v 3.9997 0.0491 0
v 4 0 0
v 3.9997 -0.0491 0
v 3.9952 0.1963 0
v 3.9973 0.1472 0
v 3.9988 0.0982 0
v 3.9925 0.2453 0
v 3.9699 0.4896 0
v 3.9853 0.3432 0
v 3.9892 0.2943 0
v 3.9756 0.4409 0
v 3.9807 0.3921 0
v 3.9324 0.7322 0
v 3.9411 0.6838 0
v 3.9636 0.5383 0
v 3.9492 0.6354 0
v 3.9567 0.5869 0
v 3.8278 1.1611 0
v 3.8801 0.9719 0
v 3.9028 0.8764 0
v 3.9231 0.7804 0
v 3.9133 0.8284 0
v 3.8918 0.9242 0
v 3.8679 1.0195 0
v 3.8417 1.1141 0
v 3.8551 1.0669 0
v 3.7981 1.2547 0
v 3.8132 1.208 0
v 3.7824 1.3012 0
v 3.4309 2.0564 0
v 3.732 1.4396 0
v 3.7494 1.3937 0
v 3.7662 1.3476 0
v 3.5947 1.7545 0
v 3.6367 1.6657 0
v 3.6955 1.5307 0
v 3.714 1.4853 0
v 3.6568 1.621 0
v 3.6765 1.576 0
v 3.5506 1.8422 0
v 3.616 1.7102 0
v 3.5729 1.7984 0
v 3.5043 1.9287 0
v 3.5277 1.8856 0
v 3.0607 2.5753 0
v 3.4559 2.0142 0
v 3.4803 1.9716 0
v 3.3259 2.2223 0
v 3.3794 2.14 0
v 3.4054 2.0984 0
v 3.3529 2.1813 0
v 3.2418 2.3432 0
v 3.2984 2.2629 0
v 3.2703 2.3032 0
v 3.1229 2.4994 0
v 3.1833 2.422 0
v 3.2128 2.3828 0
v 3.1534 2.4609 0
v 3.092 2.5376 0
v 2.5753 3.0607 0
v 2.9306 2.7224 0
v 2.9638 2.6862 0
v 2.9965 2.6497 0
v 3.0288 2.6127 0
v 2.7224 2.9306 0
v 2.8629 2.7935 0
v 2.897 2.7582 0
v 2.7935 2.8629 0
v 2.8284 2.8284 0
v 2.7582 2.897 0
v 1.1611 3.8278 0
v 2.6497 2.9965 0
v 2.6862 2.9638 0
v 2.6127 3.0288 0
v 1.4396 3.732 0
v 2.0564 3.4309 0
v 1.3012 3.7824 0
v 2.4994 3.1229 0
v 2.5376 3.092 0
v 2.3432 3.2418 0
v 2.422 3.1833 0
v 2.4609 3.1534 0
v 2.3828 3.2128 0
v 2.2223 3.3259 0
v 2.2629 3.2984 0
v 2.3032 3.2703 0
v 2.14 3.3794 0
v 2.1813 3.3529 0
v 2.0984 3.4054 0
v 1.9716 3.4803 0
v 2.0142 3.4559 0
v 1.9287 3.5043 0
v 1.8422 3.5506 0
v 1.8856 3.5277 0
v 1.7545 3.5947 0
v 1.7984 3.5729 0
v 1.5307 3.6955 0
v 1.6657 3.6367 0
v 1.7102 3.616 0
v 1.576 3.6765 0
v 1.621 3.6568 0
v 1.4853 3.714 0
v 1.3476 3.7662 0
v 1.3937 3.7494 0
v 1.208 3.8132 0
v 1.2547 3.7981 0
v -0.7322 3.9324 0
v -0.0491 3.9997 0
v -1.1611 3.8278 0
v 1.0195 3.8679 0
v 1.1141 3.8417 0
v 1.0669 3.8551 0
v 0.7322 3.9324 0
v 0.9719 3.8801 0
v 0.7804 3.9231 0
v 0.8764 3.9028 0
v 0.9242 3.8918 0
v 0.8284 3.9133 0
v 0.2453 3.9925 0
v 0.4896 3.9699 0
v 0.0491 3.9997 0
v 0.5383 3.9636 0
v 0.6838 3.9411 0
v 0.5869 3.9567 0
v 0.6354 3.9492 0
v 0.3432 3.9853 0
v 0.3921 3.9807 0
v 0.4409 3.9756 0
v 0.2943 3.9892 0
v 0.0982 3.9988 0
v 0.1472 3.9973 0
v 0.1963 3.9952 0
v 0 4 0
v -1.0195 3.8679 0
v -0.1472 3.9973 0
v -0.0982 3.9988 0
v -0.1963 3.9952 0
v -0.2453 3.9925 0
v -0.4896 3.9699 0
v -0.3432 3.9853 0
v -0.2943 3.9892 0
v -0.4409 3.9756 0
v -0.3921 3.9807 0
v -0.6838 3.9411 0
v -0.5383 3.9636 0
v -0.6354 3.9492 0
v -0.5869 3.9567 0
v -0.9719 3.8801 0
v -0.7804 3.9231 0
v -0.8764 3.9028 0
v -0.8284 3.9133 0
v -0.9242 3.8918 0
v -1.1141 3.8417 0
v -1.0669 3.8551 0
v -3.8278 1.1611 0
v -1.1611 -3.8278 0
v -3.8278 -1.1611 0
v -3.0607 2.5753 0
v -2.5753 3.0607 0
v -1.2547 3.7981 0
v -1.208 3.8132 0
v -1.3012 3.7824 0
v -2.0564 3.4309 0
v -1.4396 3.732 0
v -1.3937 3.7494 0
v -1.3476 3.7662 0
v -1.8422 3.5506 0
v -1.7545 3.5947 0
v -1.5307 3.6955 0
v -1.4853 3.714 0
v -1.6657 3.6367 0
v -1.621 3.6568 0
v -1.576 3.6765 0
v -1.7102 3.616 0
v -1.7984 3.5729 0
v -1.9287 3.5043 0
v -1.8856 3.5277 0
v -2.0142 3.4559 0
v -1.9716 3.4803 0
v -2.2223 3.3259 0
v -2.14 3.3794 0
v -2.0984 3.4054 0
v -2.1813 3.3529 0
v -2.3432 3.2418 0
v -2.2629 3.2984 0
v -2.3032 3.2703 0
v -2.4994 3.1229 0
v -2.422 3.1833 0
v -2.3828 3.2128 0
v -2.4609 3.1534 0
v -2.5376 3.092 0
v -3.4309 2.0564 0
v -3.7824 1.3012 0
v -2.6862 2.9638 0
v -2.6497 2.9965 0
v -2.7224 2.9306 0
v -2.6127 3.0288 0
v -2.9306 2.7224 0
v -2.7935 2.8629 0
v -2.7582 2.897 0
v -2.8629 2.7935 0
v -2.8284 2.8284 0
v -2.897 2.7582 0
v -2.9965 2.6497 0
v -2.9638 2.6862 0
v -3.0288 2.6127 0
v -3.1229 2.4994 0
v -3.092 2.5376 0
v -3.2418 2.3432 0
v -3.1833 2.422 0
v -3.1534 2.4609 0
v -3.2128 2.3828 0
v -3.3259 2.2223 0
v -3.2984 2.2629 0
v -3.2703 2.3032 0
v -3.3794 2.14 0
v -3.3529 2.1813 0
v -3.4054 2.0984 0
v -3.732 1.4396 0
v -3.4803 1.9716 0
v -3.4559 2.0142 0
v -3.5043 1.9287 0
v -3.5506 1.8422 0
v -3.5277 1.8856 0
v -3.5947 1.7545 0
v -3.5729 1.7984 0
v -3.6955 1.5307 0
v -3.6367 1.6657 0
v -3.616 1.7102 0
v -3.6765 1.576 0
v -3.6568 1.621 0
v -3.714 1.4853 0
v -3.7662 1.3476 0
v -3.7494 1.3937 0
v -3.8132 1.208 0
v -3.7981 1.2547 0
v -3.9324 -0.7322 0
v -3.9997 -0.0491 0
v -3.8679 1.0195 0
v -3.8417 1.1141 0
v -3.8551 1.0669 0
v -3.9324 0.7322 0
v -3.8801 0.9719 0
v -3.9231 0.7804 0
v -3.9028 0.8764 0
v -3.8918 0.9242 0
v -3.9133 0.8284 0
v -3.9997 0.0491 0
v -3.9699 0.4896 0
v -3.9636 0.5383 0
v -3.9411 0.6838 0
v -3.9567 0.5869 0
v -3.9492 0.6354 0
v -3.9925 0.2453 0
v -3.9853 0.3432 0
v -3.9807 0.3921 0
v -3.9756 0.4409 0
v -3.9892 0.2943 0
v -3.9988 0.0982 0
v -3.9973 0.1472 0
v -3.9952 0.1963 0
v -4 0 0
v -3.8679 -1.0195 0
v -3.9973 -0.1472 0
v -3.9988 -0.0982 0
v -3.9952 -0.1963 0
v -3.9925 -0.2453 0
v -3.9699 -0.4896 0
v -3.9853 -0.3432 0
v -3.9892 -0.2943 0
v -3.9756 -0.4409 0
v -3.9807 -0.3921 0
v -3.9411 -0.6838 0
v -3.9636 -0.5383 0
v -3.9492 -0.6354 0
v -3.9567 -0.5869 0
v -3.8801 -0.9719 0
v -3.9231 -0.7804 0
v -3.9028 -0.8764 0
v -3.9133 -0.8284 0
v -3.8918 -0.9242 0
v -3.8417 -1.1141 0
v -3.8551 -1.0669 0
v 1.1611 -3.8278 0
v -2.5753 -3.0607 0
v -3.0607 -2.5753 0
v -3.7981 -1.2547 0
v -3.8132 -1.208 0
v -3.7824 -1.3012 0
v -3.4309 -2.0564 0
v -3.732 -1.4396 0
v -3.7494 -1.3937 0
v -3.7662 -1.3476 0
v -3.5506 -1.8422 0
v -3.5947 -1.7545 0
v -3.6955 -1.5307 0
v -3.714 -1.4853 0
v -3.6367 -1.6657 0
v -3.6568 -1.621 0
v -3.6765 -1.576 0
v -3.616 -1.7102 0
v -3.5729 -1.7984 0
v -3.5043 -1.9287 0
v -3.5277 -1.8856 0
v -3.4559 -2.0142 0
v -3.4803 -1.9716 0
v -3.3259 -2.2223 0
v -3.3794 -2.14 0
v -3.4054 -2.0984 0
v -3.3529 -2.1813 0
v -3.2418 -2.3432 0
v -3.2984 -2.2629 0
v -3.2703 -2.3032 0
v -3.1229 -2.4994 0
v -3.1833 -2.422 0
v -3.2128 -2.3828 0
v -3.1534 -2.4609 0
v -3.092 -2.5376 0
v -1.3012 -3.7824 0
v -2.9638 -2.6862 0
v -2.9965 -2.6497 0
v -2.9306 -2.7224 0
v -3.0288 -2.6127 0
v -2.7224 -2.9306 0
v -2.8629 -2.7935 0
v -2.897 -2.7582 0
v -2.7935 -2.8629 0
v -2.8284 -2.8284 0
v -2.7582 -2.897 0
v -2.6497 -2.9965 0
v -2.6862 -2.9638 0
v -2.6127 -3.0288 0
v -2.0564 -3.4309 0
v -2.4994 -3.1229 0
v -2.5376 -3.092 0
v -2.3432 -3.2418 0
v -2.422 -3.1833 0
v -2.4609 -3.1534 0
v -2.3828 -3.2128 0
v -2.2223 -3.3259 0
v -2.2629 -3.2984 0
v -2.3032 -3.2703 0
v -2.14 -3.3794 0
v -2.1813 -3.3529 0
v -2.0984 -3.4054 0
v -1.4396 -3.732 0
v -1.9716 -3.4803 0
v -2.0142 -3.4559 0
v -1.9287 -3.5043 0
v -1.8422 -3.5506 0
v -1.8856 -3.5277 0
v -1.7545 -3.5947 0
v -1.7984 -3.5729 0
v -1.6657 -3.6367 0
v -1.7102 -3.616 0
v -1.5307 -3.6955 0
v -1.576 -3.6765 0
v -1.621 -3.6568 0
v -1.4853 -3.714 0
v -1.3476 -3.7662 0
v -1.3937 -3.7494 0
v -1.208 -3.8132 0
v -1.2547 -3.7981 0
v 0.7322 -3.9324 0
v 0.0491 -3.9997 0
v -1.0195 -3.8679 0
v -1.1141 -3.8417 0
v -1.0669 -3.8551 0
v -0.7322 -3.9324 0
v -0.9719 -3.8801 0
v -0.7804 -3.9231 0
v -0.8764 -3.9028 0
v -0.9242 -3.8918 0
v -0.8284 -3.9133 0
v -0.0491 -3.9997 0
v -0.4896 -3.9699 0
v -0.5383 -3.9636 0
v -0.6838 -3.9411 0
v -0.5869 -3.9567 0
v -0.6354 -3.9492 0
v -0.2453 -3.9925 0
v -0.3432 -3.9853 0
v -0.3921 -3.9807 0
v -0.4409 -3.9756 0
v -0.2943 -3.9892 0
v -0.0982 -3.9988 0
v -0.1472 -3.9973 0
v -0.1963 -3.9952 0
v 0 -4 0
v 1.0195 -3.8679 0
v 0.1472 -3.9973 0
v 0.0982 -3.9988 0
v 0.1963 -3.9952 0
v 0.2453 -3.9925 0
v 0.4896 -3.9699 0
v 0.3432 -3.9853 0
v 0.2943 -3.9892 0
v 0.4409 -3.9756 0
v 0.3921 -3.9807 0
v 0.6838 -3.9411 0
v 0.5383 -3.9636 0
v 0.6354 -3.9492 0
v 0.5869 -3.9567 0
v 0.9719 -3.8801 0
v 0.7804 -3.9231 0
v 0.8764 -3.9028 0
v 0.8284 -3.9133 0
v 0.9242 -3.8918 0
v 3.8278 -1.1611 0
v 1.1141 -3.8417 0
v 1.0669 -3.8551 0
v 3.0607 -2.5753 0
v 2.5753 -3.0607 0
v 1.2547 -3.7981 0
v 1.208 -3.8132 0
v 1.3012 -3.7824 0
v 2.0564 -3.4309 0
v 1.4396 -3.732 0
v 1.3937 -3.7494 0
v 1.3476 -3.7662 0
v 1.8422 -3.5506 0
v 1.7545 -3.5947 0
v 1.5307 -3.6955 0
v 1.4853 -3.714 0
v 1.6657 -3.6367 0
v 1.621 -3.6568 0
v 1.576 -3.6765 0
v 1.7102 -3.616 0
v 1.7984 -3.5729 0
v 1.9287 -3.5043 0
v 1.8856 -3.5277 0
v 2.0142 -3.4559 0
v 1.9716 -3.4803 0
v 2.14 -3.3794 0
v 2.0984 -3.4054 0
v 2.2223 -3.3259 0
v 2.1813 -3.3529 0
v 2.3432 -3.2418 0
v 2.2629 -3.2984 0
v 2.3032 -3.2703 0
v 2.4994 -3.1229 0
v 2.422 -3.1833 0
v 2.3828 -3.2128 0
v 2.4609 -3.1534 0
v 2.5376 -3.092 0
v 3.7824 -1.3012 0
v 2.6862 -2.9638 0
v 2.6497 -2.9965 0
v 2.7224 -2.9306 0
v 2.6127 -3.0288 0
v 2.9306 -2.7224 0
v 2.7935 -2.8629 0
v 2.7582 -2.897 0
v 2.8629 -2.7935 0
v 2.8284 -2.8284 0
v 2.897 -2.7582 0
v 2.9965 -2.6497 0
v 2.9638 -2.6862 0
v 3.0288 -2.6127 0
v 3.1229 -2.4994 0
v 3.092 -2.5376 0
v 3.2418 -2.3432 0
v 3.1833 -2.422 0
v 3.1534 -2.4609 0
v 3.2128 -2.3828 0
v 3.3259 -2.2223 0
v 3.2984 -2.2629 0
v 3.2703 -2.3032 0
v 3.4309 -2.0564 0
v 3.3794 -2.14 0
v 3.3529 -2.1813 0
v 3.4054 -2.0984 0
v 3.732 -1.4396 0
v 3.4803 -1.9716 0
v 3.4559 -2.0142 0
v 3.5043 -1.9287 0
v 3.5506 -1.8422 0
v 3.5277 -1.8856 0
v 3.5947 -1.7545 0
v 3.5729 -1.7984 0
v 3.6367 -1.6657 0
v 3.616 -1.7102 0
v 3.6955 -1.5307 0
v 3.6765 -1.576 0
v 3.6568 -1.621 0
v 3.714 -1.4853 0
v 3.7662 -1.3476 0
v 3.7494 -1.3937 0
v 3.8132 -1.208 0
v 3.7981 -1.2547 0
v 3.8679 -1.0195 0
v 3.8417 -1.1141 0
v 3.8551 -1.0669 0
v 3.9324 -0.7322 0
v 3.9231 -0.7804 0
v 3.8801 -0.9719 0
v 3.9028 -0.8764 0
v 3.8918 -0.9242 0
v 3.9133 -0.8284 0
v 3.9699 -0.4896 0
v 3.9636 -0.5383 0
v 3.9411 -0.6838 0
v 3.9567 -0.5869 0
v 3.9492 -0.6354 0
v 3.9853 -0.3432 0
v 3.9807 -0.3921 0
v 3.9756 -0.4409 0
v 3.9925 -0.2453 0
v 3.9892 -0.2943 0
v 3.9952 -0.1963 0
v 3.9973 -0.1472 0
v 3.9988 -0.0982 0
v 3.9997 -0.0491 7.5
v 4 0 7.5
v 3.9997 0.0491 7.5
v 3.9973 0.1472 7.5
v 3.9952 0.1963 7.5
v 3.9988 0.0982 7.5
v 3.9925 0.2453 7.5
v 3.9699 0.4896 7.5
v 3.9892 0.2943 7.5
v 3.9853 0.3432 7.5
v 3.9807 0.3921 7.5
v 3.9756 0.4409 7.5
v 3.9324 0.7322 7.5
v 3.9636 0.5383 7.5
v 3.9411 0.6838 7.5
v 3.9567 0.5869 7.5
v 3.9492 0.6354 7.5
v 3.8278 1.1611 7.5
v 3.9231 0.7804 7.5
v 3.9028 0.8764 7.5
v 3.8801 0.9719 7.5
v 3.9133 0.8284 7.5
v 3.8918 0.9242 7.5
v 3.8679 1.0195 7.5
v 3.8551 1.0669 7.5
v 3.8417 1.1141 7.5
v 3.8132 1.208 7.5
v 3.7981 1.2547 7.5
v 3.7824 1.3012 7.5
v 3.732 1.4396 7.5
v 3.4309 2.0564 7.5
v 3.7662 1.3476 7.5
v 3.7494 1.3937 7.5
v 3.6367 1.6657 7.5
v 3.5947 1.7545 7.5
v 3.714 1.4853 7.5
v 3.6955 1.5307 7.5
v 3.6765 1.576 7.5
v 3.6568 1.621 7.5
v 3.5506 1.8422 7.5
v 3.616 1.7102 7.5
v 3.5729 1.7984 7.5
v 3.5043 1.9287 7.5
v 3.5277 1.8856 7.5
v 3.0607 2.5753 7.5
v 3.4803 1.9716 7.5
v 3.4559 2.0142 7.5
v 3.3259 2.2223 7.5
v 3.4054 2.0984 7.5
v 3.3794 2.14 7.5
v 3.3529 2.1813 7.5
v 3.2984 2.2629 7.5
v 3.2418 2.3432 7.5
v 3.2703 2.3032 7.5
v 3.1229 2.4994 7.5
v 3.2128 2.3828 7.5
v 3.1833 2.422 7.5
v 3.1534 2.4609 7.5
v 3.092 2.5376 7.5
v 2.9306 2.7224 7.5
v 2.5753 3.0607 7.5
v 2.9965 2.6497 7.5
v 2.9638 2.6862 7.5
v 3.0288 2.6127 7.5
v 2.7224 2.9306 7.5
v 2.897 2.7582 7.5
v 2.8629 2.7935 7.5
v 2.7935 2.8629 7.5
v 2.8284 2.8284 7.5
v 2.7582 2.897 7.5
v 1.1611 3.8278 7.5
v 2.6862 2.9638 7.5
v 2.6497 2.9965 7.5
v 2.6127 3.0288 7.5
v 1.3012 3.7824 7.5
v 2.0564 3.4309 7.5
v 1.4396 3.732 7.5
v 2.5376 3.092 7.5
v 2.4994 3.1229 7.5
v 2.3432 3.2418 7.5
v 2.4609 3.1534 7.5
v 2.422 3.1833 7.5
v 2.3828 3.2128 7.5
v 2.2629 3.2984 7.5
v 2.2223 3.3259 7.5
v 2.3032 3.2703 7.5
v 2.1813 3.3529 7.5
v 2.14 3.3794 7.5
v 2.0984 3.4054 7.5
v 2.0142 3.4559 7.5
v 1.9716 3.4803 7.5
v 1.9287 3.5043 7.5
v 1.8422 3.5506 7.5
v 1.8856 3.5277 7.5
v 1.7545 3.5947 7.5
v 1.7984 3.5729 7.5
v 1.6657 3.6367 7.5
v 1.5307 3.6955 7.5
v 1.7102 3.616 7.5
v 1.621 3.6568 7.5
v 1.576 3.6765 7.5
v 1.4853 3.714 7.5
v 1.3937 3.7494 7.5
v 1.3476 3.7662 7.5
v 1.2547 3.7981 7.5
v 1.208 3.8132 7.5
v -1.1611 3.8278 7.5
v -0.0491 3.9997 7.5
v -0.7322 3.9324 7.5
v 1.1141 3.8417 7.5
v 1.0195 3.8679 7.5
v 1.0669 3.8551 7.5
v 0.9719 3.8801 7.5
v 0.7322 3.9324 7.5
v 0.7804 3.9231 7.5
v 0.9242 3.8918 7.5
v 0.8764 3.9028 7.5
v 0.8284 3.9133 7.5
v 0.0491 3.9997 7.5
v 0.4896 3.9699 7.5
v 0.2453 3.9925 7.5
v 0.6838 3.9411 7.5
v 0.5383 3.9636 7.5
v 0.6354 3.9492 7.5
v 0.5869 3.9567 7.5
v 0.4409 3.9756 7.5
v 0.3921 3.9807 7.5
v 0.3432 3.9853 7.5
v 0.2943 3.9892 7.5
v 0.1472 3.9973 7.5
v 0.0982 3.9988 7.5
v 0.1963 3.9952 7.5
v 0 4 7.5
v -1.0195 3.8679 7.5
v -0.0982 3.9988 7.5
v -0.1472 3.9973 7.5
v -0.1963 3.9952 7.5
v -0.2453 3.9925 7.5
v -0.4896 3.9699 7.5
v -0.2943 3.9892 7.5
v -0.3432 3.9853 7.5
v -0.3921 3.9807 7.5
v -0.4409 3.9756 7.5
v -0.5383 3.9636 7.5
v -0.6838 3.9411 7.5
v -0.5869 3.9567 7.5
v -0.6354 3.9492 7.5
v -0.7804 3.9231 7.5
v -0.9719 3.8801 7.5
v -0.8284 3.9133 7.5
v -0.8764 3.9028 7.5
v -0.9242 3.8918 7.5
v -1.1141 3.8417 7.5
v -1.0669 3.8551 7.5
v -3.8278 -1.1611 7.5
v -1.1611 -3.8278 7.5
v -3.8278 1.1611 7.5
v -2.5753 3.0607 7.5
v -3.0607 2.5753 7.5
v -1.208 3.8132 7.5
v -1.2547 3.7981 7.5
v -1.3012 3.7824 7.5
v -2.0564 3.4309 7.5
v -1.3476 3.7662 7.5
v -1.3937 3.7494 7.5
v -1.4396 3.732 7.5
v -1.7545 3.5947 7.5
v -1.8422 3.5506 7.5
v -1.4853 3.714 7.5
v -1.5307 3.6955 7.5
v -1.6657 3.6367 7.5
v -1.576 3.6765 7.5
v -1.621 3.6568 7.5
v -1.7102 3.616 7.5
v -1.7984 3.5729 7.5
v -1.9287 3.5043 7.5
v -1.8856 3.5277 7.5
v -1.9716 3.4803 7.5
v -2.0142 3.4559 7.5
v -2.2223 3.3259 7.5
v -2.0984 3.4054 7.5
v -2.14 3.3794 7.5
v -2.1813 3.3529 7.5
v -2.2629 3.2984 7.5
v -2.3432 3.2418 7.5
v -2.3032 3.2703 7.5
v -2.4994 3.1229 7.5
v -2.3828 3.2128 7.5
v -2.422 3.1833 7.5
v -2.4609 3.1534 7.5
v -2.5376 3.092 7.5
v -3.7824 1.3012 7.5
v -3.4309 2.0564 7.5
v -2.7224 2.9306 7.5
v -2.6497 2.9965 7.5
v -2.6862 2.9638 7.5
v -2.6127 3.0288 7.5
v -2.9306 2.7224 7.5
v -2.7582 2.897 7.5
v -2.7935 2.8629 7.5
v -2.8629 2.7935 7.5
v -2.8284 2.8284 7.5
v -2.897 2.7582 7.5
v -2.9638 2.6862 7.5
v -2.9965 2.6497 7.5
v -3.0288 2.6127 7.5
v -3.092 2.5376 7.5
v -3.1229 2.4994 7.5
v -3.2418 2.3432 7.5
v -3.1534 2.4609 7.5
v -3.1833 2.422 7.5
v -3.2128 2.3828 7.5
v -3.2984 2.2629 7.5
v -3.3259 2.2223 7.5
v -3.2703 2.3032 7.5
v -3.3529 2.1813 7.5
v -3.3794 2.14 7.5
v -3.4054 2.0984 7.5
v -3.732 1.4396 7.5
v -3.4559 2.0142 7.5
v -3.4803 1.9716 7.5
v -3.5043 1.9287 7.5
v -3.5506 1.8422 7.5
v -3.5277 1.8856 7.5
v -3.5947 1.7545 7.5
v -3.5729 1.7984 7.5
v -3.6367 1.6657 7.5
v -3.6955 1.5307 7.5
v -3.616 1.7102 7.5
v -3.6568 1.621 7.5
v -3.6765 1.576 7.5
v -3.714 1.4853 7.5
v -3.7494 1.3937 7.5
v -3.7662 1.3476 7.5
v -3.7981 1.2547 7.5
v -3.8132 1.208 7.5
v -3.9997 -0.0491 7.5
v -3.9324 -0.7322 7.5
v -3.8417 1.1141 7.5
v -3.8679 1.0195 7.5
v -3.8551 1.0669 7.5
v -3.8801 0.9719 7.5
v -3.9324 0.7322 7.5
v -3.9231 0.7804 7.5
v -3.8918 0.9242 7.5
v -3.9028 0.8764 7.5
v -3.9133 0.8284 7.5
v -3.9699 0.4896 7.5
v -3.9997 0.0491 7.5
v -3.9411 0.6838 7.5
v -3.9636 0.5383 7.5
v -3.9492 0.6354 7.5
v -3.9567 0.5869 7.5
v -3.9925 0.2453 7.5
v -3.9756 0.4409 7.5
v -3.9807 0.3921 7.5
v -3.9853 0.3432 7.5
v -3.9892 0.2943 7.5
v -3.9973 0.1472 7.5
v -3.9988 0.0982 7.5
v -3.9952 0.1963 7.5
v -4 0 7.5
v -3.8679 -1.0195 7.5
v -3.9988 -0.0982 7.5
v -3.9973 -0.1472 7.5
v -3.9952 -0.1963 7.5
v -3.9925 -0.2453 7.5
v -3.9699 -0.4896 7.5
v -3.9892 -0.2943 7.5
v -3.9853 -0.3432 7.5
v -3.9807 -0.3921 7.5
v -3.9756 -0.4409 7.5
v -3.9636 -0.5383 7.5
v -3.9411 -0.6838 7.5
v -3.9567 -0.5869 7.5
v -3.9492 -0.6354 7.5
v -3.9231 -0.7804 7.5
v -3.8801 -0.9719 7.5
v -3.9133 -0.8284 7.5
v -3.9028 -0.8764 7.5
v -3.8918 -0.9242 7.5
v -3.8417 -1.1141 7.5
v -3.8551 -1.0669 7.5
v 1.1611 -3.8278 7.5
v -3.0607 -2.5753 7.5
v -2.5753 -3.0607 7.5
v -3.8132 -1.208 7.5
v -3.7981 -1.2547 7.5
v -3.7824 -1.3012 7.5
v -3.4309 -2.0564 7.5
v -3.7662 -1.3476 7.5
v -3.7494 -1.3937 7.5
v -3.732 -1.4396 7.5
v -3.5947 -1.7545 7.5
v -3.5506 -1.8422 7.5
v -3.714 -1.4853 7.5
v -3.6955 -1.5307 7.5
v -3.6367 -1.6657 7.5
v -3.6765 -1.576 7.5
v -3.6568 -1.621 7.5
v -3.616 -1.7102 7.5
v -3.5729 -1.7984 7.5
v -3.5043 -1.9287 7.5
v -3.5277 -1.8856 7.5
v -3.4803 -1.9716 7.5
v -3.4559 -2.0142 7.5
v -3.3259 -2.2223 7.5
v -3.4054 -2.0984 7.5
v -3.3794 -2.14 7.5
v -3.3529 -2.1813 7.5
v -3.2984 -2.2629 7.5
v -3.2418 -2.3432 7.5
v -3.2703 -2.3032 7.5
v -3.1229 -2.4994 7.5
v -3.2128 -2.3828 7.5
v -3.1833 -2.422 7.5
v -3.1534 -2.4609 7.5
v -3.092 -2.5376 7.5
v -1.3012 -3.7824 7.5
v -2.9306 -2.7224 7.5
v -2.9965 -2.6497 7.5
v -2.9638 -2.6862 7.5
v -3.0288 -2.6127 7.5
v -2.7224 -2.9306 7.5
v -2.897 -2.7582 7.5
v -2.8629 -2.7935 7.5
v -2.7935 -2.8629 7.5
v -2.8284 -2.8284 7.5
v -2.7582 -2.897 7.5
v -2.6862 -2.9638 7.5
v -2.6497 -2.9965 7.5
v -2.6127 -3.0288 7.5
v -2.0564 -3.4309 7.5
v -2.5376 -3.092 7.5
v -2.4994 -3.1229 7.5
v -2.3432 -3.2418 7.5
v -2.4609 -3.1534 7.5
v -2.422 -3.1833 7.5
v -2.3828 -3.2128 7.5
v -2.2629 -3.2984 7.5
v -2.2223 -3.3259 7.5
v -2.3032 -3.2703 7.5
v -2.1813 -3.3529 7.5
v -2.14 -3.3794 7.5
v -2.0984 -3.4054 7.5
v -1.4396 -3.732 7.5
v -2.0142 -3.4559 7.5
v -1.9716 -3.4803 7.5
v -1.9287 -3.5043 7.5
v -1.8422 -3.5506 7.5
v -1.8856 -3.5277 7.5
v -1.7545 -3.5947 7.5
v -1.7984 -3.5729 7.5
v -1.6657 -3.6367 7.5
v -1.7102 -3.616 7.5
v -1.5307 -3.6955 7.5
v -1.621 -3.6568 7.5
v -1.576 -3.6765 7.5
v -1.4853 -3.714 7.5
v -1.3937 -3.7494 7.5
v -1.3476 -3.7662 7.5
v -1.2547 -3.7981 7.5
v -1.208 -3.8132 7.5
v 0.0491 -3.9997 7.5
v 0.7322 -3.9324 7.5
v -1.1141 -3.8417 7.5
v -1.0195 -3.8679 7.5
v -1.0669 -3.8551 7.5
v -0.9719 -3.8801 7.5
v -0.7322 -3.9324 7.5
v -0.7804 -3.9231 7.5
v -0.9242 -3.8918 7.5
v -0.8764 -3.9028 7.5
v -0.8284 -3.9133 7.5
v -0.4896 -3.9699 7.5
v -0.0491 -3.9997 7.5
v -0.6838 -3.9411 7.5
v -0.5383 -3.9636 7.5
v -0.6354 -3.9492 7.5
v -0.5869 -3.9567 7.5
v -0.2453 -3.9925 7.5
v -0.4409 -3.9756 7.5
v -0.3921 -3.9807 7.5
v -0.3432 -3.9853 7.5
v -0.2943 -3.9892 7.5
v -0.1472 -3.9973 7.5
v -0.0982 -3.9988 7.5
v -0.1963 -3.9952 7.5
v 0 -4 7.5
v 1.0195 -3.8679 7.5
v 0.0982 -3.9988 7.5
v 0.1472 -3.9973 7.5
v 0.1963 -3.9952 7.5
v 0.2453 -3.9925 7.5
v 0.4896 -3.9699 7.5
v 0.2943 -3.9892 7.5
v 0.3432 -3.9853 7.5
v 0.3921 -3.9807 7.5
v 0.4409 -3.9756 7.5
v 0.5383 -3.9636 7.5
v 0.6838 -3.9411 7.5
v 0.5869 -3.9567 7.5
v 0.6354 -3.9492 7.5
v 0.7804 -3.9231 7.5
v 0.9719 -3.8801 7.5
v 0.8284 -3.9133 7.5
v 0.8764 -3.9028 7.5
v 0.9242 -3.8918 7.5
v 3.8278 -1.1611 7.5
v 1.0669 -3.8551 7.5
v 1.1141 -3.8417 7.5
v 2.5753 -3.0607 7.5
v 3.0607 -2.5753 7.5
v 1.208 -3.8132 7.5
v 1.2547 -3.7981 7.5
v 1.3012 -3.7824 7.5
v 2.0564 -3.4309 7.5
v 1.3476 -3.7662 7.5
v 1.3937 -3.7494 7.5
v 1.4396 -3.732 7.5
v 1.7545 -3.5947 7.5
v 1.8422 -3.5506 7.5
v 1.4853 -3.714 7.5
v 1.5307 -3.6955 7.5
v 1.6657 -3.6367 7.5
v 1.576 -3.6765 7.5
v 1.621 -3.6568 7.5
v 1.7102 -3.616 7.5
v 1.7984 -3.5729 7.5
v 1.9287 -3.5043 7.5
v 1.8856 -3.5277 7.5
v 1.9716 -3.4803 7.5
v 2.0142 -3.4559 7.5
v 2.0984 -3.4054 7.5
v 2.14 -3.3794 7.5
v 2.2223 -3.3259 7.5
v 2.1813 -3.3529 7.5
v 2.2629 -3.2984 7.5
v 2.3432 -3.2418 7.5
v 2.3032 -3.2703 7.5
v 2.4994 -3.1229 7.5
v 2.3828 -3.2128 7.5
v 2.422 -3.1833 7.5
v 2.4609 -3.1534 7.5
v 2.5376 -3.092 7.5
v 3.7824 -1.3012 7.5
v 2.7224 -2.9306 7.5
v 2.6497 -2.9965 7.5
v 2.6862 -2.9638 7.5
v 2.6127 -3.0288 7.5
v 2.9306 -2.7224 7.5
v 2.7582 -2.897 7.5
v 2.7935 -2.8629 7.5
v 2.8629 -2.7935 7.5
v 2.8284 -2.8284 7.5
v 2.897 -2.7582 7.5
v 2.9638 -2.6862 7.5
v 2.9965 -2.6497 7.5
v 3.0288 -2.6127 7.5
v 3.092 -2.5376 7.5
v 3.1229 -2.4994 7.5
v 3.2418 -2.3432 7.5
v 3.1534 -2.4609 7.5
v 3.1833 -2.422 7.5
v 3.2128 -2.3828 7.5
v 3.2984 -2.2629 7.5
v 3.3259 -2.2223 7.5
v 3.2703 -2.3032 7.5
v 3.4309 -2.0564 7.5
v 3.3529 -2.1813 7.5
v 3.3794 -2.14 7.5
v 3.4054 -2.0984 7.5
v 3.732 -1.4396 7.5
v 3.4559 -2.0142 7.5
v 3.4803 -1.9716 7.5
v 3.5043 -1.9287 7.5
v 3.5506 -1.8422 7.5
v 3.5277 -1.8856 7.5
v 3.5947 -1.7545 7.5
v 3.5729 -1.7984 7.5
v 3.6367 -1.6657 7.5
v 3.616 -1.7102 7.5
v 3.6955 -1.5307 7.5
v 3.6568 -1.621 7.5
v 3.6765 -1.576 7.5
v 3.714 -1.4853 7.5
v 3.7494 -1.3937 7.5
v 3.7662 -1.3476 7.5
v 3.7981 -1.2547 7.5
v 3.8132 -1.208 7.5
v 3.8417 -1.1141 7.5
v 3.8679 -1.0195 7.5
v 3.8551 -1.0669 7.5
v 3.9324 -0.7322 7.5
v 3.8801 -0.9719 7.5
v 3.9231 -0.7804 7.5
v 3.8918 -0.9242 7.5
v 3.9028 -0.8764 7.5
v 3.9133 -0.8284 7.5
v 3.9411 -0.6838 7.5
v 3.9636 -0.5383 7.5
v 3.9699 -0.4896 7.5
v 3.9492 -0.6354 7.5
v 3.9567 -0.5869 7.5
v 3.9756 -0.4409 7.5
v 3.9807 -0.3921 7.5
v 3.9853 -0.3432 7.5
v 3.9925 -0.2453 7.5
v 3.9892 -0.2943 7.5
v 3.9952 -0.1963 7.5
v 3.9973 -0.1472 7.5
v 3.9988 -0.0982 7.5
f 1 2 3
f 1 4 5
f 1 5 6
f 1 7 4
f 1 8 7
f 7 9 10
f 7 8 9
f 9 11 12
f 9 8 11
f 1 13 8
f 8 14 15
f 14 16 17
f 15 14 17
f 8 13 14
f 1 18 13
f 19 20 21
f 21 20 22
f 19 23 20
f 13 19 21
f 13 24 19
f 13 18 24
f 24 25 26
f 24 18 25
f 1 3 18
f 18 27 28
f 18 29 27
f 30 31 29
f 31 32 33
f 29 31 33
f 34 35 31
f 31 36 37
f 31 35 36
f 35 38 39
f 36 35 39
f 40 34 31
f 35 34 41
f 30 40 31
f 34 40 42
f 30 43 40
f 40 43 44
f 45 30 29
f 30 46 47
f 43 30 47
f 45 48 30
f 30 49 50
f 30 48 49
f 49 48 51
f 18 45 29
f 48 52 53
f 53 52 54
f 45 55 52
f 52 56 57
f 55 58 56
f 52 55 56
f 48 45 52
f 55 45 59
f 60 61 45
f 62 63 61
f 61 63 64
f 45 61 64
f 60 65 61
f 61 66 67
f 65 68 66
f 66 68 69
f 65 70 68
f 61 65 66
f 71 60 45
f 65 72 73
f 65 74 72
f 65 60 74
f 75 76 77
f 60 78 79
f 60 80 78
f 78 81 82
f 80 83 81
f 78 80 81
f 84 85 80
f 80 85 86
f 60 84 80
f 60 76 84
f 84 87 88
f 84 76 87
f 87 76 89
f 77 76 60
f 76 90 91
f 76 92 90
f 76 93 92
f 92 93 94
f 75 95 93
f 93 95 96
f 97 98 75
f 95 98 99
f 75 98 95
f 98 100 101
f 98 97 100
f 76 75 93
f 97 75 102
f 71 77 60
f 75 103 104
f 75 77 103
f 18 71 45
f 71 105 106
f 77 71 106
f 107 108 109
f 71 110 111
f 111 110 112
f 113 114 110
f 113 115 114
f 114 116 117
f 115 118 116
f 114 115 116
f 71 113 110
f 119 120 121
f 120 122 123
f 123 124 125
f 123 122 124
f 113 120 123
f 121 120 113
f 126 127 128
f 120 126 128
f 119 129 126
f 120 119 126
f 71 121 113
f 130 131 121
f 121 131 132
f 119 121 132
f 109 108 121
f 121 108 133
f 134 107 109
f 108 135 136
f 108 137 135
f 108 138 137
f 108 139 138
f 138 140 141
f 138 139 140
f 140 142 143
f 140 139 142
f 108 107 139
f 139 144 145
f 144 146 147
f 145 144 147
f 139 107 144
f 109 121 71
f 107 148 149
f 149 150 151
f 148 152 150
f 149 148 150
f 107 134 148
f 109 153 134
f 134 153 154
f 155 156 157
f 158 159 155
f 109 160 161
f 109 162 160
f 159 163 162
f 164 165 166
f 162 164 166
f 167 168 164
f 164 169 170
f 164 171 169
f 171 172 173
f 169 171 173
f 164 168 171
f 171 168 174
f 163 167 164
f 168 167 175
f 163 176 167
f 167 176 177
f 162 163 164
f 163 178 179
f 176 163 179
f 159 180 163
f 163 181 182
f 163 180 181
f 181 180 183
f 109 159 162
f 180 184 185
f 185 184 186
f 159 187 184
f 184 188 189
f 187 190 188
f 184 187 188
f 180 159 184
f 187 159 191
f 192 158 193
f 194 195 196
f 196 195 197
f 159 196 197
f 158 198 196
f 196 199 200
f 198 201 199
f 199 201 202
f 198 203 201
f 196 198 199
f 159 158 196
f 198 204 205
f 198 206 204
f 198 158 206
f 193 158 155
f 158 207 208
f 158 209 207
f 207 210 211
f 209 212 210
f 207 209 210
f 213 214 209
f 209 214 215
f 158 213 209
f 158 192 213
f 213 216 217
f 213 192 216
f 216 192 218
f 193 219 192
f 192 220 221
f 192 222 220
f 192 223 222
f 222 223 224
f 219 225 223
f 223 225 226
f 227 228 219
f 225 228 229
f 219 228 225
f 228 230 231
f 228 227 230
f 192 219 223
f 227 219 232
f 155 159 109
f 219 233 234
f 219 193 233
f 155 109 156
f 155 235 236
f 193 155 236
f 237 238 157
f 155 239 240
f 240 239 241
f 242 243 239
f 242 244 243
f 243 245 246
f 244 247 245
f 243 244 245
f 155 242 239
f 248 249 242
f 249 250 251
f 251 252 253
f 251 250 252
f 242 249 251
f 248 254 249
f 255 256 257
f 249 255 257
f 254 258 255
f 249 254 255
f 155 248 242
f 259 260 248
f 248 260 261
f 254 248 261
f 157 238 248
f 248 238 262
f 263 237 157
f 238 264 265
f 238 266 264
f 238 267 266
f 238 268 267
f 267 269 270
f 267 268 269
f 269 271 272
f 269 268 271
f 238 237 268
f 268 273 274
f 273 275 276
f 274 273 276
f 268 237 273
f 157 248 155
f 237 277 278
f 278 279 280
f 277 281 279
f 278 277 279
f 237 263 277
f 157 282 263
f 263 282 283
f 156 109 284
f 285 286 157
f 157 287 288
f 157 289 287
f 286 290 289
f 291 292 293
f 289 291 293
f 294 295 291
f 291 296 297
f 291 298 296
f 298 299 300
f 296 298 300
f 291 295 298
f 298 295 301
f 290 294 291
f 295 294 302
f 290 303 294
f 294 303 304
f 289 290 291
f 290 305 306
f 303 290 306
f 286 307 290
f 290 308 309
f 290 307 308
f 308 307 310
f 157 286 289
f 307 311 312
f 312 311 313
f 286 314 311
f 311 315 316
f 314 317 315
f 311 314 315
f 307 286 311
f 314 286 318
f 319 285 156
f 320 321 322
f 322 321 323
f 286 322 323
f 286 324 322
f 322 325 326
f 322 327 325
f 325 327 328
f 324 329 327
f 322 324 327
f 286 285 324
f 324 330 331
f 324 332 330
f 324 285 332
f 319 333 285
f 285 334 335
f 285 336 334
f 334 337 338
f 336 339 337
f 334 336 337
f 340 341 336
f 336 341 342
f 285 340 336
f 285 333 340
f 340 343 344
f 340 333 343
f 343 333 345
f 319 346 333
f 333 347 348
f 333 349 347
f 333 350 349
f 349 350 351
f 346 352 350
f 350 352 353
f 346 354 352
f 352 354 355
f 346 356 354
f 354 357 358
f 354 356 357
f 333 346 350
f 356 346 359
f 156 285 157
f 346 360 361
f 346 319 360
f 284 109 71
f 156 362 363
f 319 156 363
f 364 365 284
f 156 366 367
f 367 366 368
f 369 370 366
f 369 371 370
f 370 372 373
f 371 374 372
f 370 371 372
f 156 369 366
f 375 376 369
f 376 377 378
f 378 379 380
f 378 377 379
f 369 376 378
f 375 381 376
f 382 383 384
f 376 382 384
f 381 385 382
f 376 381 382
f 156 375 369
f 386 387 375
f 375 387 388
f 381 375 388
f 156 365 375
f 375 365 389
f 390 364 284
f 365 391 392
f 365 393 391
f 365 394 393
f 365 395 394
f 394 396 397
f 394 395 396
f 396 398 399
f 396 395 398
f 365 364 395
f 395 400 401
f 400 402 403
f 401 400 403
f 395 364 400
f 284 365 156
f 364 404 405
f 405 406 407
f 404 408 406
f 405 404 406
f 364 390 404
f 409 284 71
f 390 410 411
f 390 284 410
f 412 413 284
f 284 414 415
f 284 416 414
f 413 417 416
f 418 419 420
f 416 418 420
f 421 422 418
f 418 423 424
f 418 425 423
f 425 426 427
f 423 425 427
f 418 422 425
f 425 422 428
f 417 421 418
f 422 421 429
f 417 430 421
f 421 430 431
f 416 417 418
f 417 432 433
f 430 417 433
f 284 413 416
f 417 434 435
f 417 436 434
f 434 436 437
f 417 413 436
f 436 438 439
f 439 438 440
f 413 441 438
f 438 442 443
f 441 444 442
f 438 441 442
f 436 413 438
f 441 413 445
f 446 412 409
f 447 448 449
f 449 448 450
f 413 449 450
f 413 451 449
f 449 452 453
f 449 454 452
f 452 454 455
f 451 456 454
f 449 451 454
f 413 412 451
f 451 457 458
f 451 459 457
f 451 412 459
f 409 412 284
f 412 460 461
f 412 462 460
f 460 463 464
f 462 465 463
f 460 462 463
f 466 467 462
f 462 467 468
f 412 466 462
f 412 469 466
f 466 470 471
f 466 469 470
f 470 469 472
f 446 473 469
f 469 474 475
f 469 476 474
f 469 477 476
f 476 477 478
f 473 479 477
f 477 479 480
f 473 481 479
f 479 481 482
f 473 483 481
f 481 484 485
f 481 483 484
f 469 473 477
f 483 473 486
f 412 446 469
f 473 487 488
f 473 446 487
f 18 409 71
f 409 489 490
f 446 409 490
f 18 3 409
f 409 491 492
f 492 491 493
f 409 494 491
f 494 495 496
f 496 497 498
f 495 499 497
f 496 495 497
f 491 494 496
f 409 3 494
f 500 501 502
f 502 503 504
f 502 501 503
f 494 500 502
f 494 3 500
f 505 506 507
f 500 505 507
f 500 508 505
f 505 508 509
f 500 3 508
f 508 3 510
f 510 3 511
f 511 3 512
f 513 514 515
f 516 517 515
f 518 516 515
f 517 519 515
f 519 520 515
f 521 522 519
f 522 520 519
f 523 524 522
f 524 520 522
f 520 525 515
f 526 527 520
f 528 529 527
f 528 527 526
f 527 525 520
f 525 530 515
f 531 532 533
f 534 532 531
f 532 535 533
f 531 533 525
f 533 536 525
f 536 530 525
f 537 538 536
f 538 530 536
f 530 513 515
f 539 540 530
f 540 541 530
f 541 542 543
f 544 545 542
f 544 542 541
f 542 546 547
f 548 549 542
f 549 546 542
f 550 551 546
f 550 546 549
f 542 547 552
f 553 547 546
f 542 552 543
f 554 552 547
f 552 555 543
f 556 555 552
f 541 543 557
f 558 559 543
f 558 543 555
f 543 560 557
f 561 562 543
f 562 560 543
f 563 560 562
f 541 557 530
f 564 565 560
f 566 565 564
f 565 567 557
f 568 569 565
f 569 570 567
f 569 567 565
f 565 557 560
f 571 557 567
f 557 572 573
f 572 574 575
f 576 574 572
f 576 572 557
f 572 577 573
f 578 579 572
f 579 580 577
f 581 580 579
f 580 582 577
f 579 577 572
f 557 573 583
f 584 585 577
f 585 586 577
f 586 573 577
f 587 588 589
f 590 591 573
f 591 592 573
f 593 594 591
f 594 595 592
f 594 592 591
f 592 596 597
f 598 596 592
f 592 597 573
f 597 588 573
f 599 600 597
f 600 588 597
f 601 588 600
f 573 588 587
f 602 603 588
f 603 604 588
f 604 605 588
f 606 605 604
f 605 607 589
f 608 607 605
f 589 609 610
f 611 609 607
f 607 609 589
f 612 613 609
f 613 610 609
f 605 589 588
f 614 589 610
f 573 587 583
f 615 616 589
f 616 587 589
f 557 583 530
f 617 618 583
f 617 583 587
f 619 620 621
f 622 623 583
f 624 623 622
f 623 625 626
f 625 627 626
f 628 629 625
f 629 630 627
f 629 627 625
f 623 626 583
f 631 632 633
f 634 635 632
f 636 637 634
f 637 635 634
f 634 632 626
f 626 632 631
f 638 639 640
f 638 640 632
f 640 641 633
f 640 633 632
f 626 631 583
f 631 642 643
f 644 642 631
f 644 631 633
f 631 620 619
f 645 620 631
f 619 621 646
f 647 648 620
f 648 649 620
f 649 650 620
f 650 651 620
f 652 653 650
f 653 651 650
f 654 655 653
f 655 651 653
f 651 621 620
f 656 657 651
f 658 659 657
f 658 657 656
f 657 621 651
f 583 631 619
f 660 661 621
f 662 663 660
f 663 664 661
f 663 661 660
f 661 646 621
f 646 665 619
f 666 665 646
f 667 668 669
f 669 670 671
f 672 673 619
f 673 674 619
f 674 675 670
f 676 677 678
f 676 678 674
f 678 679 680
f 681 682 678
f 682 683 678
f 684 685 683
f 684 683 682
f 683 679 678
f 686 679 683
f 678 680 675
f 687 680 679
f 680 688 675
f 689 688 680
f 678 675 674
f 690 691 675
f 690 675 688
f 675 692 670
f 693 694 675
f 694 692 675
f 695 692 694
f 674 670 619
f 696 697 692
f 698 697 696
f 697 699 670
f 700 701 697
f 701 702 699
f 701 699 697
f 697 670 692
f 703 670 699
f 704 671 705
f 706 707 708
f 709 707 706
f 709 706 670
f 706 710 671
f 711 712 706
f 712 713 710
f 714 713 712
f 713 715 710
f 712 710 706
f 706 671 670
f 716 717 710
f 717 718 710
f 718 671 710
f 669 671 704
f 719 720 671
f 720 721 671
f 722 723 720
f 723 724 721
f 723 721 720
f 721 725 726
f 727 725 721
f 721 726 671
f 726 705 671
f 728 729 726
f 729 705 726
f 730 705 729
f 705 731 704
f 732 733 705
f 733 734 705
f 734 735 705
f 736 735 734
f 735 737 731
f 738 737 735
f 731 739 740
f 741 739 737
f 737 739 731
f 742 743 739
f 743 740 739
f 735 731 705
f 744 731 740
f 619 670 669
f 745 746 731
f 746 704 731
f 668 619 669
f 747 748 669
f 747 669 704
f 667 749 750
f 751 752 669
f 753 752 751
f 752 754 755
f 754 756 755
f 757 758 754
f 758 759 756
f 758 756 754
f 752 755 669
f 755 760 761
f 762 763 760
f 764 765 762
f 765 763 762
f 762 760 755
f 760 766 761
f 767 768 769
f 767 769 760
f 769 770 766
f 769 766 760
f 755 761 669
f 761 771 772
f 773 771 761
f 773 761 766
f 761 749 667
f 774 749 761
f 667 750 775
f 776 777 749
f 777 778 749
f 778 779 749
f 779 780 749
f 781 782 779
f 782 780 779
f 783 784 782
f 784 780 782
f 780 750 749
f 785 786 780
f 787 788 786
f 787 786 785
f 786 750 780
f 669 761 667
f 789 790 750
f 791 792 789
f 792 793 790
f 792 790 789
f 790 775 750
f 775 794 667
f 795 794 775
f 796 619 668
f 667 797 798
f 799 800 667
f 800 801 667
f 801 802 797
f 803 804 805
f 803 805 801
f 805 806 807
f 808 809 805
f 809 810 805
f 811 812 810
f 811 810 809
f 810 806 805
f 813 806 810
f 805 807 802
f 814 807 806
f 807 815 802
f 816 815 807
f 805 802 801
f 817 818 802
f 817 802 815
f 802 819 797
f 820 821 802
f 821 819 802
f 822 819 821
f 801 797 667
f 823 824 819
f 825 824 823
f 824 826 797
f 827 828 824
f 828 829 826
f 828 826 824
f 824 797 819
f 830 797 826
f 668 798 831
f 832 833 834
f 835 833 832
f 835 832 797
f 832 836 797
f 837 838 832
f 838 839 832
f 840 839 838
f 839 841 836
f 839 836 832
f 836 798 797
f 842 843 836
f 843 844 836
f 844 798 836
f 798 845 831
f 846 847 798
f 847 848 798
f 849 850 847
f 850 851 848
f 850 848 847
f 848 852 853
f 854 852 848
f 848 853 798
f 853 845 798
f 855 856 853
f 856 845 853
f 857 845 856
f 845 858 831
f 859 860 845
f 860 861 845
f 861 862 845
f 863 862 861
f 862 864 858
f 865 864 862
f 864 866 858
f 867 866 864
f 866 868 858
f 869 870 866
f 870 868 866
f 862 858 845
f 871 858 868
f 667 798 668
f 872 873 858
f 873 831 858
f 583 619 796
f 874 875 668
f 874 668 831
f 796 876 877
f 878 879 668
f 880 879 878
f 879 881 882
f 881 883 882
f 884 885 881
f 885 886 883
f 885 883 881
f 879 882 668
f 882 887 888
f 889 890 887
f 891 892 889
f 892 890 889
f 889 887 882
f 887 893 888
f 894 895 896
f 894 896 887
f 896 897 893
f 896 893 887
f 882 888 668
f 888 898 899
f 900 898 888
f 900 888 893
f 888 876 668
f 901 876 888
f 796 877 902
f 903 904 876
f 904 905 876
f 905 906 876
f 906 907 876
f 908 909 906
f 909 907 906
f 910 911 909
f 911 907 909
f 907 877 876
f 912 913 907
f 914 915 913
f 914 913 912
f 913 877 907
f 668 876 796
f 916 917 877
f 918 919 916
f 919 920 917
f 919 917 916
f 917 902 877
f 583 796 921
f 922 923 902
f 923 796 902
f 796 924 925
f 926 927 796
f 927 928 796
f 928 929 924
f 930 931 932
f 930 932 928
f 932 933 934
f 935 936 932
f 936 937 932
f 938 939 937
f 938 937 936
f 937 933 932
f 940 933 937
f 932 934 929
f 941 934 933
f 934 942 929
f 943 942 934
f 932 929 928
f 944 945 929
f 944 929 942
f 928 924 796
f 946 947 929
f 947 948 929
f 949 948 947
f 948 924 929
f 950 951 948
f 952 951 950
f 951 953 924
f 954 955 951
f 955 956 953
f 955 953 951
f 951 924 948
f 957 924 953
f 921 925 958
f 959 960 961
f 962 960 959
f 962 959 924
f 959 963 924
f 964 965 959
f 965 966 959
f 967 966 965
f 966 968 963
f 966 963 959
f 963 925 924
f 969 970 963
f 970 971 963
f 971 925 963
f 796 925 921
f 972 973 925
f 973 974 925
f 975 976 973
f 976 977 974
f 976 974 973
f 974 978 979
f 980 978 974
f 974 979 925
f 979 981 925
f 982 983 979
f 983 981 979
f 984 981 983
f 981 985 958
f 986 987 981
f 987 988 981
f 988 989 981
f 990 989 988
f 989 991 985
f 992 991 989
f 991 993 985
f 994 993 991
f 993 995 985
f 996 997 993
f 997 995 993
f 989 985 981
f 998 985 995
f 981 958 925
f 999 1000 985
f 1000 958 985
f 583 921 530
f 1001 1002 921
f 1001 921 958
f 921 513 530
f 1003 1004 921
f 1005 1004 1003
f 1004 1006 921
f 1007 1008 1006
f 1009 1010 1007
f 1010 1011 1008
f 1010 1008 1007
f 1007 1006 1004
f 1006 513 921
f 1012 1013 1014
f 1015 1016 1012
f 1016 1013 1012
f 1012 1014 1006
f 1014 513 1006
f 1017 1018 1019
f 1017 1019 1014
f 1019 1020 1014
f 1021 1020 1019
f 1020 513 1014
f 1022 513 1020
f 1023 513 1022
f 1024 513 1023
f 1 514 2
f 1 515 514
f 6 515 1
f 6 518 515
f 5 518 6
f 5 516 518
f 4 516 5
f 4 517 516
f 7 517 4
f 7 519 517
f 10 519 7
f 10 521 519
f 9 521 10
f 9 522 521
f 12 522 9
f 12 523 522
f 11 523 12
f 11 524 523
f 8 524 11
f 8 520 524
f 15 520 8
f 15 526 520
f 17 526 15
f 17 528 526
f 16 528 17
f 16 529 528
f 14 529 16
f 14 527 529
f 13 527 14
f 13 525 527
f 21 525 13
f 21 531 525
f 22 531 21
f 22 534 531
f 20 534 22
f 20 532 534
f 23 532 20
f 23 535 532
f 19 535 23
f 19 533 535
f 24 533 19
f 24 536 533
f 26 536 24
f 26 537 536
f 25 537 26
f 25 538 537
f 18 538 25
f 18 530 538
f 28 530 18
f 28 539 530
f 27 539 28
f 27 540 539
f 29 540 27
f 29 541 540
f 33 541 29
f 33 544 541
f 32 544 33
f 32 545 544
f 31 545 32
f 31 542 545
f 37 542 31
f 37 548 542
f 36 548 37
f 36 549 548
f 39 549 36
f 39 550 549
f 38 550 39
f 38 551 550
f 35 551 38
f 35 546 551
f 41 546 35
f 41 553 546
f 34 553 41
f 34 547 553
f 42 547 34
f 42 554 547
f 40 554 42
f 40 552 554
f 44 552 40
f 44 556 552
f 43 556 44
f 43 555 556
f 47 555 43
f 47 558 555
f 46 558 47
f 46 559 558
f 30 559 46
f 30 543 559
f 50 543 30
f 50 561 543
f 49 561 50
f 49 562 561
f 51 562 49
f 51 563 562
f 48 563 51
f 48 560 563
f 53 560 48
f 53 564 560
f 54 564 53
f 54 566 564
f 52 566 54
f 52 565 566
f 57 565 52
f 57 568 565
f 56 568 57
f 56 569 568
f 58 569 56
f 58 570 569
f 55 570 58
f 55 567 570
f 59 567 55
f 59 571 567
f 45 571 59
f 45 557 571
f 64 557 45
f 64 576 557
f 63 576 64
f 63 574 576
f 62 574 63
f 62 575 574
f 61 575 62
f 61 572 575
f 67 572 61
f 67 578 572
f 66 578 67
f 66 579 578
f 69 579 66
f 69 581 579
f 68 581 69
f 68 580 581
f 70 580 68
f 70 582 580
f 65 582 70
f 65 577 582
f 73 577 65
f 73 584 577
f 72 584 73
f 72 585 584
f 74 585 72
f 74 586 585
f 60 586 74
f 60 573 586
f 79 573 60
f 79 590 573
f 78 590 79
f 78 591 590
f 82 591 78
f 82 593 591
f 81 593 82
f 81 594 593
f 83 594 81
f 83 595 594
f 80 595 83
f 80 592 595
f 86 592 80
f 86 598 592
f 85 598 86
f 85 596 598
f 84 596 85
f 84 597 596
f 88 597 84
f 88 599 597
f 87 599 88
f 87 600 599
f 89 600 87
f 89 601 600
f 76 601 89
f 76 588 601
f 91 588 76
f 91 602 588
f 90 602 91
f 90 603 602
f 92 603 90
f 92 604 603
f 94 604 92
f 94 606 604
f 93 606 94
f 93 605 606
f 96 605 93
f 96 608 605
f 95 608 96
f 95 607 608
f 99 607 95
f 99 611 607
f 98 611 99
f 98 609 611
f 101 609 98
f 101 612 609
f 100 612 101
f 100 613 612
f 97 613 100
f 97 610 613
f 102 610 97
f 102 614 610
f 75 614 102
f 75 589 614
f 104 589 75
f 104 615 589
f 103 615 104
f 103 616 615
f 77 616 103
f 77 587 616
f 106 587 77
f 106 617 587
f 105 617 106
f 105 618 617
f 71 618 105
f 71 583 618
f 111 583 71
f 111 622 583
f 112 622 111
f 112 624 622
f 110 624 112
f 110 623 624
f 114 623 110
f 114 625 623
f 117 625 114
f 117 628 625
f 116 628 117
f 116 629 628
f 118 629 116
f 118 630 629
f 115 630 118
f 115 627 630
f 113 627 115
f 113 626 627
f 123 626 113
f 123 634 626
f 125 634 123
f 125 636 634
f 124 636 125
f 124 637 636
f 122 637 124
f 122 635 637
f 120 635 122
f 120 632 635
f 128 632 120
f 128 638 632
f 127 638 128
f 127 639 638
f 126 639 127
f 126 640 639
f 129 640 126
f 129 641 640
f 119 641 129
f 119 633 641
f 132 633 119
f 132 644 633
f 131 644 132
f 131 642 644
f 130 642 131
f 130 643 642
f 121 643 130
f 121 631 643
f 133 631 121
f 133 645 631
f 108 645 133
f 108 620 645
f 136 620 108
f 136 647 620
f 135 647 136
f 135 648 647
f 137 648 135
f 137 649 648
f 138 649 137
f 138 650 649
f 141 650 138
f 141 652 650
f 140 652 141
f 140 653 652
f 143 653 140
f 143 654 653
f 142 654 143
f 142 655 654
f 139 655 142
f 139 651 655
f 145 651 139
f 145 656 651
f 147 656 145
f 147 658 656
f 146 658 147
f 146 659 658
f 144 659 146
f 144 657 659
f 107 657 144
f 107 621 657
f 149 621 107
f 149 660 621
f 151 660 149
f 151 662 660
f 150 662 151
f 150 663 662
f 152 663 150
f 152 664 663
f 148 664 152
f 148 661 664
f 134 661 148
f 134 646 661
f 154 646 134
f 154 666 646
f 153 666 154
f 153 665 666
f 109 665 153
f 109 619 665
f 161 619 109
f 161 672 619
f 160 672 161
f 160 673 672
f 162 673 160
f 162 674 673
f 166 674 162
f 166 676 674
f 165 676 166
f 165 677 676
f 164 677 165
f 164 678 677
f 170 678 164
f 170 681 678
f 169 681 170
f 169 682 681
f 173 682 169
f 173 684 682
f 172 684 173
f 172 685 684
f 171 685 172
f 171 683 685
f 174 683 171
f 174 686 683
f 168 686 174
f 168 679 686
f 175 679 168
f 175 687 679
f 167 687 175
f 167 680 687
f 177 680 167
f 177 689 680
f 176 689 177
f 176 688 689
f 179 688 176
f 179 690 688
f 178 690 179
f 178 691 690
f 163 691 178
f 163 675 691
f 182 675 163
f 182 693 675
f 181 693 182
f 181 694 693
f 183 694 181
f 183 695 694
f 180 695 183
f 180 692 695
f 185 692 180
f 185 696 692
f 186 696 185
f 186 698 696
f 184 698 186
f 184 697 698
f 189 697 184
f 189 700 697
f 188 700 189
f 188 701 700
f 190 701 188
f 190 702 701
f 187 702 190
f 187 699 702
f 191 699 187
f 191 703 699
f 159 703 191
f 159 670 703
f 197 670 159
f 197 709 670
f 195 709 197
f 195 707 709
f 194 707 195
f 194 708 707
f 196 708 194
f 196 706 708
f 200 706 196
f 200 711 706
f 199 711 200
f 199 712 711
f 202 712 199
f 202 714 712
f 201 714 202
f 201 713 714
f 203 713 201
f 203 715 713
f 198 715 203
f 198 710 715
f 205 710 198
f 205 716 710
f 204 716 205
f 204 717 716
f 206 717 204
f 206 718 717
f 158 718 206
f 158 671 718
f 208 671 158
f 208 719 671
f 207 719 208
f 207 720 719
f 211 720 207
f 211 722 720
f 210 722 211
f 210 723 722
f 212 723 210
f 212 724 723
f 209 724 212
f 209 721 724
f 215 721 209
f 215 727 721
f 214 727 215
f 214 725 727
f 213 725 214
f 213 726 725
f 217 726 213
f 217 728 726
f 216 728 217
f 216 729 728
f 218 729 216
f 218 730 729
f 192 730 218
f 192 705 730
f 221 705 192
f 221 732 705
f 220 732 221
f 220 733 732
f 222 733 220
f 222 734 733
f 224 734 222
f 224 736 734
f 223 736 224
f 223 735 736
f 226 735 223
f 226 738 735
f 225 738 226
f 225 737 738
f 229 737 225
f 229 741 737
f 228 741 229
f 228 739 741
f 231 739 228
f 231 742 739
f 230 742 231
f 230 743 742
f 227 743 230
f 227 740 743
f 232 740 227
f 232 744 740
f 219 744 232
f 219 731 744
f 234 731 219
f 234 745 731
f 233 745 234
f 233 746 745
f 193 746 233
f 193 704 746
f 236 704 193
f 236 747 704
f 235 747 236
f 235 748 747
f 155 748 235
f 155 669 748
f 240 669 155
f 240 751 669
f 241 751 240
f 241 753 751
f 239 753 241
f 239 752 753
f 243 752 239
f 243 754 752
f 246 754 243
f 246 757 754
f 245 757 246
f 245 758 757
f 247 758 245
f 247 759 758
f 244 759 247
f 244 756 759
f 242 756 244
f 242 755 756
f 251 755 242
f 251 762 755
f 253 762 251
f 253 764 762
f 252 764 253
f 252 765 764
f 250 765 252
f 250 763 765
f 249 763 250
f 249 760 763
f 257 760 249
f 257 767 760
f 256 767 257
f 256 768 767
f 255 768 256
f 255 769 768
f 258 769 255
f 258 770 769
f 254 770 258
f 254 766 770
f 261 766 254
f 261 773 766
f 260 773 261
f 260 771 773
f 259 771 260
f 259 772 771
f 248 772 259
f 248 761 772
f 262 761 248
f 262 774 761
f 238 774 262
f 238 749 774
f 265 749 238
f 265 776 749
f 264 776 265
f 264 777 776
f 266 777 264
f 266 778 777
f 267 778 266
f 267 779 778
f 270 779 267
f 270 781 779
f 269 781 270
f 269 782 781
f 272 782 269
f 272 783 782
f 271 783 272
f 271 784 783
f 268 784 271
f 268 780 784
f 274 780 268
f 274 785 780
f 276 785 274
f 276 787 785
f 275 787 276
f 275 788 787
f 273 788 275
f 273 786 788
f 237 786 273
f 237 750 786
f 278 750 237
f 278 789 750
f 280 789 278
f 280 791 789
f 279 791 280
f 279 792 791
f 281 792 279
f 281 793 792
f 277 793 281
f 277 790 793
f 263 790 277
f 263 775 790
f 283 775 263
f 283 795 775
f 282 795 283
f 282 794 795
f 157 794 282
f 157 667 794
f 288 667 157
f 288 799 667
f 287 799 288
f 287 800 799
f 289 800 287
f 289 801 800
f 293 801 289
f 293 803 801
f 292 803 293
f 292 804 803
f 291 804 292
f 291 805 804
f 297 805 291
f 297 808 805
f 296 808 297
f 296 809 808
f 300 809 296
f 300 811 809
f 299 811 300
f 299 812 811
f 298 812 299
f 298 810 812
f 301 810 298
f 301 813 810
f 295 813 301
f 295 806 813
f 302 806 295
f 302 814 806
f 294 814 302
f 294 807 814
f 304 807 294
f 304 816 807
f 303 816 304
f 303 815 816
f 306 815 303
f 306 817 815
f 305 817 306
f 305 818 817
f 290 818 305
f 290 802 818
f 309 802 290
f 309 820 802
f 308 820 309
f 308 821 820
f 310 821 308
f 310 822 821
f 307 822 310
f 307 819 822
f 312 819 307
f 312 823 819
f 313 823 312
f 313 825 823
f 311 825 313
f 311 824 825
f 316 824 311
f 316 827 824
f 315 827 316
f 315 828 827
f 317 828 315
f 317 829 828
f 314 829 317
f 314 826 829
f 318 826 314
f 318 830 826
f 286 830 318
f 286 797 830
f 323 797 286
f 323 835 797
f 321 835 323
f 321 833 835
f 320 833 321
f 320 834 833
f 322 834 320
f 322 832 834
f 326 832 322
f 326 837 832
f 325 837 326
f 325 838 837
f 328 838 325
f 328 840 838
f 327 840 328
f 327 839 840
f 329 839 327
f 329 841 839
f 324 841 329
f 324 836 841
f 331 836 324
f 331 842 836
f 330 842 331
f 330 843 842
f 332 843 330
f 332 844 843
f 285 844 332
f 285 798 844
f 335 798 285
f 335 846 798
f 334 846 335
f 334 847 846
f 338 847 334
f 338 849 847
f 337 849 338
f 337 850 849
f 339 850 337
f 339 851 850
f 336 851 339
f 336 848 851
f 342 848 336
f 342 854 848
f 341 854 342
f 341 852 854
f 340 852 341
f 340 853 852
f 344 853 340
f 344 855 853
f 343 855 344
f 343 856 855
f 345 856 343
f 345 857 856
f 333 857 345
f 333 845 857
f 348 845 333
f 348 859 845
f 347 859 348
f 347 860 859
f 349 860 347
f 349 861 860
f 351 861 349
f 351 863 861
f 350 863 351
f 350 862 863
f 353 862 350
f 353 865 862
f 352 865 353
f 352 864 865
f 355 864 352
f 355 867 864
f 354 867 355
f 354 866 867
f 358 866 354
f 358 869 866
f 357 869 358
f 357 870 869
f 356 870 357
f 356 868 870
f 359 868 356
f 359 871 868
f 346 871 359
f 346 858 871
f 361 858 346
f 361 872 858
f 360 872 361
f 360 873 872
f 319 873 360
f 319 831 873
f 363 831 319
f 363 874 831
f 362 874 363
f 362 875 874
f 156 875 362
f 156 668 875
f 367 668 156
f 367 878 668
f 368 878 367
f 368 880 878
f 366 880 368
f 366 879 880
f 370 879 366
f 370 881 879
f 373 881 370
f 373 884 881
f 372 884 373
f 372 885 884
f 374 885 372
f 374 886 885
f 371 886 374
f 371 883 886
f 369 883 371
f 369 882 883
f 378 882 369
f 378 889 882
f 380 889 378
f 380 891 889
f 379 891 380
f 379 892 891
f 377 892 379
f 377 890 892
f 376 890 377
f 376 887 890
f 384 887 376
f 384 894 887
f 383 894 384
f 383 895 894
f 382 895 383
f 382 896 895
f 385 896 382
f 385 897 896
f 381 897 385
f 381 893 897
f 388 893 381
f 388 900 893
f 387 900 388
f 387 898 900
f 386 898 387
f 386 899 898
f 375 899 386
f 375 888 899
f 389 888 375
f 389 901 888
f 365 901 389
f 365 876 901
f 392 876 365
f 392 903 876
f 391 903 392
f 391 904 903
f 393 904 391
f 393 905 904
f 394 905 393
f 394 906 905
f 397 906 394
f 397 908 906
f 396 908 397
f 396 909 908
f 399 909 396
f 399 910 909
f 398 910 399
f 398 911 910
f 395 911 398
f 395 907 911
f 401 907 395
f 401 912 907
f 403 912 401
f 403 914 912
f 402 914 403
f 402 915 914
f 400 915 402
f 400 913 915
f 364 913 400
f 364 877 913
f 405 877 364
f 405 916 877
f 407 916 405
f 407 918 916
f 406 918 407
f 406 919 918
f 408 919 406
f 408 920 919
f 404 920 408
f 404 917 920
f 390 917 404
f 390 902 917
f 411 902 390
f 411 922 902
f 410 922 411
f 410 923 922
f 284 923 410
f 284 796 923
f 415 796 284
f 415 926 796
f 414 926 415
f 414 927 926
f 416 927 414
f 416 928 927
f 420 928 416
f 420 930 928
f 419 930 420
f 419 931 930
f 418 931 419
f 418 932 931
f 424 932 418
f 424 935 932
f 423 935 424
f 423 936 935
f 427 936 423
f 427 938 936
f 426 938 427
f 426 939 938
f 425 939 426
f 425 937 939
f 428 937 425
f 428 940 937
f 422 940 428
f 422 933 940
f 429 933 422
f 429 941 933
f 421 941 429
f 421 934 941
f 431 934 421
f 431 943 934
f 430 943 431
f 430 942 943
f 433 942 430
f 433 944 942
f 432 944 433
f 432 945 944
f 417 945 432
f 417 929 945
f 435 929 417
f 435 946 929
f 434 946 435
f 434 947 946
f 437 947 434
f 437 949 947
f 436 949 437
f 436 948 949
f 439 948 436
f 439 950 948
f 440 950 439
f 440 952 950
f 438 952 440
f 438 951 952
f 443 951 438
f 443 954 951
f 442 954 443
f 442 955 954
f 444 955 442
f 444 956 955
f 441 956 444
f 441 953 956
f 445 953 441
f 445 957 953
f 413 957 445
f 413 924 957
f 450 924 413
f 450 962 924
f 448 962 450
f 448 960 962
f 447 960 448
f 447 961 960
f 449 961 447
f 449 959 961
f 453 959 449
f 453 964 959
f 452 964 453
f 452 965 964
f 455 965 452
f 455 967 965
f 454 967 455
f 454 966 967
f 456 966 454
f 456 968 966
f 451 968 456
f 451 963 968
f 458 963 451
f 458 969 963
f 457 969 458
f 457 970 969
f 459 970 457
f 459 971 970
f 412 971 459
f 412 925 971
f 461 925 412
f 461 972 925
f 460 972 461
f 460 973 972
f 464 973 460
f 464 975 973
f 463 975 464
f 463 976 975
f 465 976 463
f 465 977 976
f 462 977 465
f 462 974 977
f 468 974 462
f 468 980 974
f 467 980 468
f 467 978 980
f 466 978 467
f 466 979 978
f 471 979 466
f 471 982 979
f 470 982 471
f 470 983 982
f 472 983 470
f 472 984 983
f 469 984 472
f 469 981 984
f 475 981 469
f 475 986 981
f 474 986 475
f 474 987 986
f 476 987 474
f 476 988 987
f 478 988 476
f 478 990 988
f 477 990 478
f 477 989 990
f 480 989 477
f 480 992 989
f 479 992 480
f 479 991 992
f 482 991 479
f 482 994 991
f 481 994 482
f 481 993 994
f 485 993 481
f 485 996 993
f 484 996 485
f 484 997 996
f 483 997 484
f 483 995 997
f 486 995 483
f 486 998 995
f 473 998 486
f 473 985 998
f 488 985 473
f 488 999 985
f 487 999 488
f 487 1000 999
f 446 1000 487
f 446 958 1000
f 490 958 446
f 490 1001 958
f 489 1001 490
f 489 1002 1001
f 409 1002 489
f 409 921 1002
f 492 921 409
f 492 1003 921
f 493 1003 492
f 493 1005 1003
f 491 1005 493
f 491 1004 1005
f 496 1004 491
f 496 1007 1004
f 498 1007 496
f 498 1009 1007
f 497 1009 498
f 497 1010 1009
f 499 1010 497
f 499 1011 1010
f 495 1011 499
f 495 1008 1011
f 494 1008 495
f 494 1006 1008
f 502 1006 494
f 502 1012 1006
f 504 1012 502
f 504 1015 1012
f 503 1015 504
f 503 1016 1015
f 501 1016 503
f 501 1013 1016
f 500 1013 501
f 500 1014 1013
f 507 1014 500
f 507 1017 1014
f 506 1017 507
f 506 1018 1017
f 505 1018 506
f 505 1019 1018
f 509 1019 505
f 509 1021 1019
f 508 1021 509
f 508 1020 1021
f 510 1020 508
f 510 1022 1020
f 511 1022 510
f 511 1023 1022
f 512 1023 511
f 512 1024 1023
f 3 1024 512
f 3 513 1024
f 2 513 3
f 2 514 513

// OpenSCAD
total_diameter=8;
total_height=7.5;

$fn=512;
linear_extrude(total_height) circle(d=total_diameter);
